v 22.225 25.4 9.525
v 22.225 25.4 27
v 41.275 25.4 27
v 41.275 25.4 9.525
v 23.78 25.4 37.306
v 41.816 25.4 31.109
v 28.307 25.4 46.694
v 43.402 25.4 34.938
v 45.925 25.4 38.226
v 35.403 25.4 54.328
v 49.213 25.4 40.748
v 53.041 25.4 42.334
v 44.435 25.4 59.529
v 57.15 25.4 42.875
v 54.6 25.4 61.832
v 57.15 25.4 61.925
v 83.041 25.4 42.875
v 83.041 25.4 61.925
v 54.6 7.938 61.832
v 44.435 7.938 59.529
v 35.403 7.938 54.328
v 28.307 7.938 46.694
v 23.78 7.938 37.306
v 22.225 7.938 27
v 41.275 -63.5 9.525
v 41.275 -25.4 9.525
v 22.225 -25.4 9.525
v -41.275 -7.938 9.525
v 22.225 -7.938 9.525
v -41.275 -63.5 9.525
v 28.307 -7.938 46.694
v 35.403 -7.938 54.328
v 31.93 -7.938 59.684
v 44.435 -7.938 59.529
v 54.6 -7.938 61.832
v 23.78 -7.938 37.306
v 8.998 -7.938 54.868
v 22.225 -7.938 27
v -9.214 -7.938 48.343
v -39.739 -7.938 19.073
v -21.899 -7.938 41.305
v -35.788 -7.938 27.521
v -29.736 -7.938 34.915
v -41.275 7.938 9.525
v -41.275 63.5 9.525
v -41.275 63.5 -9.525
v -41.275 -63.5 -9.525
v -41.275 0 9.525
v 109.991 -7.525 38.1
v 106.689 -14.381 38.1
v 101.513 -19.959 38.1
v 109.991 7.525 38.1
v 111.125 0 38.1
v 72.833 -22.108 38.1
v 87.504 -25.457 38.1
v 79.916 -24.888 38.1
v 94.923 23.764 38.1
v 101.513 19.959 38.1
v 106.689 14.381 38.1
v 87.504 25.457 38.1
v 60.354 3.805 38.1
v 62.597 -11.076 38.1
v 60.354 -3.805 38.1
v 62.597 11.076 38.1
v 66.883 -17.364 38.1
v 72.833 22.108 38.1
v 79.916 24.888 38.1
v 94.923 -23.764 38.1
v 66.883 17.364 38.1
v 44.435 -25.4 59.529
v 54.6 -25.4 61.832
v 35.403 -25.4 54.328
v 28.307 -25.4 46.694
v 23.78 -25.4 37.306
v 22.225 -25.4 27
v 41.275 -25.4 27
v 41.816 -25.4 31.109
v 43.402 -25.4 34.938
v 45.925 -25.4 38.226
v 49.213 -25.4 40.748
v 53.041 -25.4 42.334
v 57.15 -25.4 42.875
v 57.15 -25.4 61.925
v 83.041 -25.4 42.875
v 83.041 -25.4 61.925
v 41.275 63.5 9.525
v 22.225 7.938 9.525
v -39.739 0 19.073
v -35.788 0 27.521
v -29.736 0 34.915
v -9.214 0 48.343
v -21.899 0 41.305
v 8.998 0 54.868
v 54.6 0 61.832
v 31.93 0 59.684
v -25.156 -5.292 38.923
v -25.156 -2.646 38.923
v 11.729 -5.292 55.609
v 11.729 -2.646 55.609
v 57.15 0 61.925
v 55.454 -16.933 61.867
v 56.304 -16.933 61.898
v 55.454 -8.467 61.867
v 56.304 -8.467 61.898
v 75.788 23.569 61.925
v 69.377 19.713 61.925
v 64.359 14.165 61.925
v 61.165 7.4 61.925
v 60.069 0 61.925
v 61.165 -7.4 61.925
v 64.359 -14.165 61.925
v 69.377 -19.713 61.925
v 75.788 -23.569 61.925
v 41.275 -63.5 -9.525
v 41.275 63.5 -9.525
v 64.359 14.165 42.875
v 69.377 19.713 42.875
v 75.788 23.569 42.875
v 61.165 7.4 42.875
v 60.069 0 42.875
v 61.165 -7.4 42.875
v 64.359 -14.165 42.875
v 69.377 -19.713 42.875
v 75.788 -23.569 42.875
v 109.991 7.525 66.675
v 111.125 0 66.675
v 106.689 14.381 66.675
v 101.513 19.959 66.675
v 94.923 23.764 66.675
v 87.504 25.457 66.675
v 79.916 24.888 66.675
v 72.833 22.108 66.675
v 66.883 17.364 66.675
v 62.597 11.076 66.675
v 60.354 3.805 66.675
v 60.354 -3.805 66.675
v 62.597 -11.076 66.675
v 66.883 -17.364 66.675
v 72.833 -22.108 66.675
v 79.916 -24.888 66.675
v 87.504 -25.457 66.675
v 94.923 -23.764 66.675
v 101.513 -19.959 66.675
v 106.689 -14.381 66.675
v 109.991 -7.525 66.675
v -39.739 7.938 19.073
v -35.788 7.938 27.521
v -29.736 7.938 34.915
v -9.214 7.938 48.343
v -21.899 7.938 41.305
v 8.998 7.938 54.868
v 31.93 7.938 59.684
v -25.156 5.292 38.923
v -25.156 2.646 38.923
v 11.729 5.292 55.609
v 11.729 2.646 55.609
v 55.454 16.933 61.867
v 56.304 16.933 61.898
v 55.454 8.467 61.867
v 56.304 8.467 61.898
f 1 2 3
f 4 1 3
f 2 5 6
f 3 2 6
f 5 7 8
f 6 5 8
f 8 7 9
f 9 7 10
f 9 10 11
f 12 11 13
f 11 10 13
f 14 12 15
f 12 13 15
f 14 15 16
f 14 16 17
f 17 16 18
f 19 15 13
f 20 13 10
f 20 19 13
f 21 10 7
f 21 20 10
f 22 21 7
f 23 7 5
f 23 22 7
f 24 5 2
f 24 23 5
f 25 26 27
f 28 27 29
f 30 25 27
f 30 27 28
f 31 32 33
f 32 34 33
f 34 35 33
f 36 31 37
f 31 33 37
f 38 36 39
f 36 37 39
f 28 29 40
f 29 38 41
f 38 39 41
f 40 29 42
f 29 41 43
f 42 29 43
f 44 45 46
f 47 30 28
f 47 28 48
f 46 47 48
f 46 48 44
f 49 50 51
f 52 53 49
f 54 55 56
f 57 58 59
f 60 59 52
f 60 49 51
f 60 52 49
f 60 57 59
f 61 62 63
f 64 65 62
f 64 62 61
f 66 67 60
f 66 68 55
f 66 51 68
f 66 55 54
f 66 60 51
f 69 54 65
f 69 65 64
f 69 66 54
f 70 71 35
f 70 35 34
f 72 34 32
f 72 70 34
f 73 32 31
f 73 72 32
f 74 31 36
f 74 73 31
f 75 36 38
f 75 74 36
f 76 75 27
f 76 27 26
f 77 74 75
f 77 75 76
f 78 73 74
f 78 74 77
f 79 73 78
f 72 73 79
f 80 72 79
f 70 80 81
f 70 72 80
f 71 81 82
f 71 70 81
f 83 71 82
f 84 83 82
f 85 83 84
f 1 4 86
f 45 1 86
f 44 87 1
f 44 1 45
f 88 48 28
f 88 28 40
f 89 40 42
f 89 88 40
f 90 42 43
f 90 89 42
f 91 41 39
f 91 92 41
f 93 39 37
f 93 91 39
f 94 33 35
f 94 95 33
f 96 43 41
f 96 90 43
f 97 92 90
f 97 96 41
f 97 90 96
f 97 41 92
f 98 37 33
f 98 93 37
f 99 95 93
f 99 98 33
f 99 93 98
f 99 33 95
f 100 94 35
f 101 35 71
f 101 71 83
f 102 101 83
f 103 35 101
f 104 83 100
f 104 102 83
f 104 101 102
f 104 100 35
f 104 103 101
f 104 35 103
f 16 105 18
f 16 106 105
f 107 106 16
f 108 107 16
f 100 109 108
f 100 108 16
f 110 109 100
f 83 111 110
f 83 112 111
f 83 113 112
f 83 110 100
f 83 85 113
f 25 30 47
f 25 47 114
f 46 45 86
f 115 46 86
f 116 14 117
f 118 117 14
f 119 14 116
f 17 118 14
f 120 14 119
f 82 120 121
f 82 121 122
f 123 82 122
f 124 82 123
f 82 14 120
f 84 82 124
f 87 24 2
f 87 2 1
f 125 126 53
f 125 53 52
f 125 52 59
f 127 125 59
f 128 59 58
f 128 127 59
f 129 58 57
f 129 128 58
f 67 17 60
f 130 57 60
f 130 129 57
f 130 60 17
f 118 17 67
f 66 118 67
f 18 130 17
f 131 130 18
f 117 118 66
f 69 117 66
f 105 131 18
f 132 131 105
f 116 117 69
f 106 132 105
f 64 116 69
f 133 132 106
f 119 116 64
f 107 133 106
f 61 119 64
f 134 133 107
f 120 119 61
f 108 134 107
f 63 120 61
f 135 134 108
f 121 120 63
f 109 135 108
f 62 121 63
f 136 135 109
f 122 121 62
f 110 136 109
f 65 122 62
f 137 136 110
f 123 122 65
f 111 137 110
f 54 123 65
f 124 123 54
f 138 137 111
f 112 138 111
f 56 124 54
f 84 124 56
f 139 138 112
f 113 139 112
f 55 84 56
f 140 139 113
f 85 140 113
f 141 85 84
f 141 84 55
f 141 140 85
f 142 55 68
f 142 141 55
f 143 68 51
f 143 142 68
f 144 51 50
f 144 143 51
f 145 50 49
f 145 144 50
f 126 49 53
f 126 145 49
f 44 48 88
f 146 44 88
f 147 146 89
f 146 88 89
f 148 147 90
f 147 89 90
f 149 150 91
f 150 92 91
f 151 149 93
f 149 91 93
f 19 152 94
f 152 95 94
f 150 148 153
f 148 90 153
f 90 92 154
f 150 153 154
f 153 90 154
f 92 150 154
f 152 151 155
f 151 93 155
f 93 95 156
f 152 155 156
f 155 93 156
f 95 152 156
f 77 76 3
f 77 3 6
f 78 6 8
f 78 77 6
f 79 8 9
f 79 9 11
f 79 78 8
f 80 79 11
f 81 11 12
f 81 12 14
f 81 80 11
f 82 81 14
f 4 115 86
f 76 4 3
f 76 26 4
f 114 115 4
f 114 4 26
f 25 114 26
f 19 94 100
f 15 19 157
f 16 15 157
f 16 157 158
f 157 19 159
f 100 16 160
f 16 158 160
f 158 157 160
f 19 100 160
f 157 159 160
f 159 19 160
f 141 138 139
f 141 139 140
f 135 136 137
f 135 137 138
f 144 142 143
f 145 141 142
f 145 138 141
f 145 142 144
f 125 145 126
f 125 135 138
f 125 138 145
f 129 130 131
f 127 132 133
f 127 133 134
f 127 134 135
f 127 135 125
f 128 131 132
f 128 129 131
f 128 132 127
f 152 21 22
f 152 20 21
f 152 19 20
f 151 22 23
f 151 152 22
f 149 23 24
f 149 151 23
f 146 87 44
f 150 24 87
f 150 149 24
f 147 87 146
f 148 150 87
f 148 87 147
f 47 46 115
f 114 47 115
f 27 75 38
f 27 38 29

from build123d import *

# Parameters (mm, degrees)
F1_DEPTH = 63.5
F0_W     = 25.2717524765
F0_H     = 19.05
F2_DEPTH = 25.4
F3_DEPTH = 7.9375


with BuildPart() as f1:
    # F0 (on Front) → F1 (new body, symmetric)
    with BuildSketch(Plane.XZ):
        Polygon((22.225, 9.525), (-41.275, 9.525), (-41.275, -9.525), (41.275, -9.525), (41.275, 9.525), align=None)
    extrude(amount=F1_DEPTH, both=True)

    # F0 (on Front) → F2 (join, symmetric)
    with BuildSketch(Plane.XZ):
        with BuildLine():
            Line((22.225, 27.0002), (22.225, 9.525))
            Line((22.225, 9.525), (41.275, 9.525))
            Line((41.275, 9.525), (41.275, 27.0002))
            ThreePointArc((41.275, 27.0002), (45.9246798487, 38.2255201513), (57.15, 42.8752))
            Line((57.15, 42.8752), (60.325, 42.8752))
            Line((60.325, 42.8752), (60.325, 61.9252))
            Line((60.325, 61.9252), (57.15, 61.9252))
            add(Edge.make_bspline(
                [(54.6000717025, 61.8319885082), (55.4560192886, 61.8684142099), (56.3061980805, 61.8994538624), (57.15, 61.9252)],
                knots=[109.2208050055, 109.2208050055, 109.2208050055, 109.2208050055, 111.5045361635, 111.5045361635, 111.5045361635, 111.5045361635], degree=3))
            ThreePointArc((54.6000717025, 61.8319885082), (31.5686408611, 50.7772832863), (22.225, 27.0002))
        make_face()
        with Locations((72.9608762383, 52.4002)):
            Rectangle(F0_W, F0_H)
    extrude(amount=F2_DEPTH, both=True)

    # F0 (on Front) → F3 (join, symmetric)
    with BuildSketch(Plane.XZ):
        with BuildLine():
            add(Edge.make_bspline(
                [(-41.275, 9.525), (-40.467228221, 46.0283825341), (13.6638677739, 60.0899075916), (54.6000717025, 61.8319885082)],
                knots=[0, 0, 0, 0, 109.2208050055, 109.2208050055, 109.2208050055, 109.2208050055], degree=3))
            Line((-41.275, 9.525), (22.225, 9.525))
            Line((22.225, 9.525), (22.225, 27.0002))
            ThreePointArc((22.225, 27.0002), (31.5686408611, 50.7772832863), (54.6000717025, 61.8319885082))
        make_face()
    extrude(amount=F3_DEPTH, both=True)

    # F0 (on Front) → F4 (revolve)
    with BuildSketch(Plane.XZ):
        Polygon((85.5967524765, 66.675), (85.5967524765, 61.9252), (85.5967524765, 42.8752), (85.5967524765, 38.1), (111.125, 38.1), (111.125, 66.675), align=None)
    revolve(axis=Axis((85.5967524765, 0, 52.3875), (0, 0, 1)))


solid = f1.part
